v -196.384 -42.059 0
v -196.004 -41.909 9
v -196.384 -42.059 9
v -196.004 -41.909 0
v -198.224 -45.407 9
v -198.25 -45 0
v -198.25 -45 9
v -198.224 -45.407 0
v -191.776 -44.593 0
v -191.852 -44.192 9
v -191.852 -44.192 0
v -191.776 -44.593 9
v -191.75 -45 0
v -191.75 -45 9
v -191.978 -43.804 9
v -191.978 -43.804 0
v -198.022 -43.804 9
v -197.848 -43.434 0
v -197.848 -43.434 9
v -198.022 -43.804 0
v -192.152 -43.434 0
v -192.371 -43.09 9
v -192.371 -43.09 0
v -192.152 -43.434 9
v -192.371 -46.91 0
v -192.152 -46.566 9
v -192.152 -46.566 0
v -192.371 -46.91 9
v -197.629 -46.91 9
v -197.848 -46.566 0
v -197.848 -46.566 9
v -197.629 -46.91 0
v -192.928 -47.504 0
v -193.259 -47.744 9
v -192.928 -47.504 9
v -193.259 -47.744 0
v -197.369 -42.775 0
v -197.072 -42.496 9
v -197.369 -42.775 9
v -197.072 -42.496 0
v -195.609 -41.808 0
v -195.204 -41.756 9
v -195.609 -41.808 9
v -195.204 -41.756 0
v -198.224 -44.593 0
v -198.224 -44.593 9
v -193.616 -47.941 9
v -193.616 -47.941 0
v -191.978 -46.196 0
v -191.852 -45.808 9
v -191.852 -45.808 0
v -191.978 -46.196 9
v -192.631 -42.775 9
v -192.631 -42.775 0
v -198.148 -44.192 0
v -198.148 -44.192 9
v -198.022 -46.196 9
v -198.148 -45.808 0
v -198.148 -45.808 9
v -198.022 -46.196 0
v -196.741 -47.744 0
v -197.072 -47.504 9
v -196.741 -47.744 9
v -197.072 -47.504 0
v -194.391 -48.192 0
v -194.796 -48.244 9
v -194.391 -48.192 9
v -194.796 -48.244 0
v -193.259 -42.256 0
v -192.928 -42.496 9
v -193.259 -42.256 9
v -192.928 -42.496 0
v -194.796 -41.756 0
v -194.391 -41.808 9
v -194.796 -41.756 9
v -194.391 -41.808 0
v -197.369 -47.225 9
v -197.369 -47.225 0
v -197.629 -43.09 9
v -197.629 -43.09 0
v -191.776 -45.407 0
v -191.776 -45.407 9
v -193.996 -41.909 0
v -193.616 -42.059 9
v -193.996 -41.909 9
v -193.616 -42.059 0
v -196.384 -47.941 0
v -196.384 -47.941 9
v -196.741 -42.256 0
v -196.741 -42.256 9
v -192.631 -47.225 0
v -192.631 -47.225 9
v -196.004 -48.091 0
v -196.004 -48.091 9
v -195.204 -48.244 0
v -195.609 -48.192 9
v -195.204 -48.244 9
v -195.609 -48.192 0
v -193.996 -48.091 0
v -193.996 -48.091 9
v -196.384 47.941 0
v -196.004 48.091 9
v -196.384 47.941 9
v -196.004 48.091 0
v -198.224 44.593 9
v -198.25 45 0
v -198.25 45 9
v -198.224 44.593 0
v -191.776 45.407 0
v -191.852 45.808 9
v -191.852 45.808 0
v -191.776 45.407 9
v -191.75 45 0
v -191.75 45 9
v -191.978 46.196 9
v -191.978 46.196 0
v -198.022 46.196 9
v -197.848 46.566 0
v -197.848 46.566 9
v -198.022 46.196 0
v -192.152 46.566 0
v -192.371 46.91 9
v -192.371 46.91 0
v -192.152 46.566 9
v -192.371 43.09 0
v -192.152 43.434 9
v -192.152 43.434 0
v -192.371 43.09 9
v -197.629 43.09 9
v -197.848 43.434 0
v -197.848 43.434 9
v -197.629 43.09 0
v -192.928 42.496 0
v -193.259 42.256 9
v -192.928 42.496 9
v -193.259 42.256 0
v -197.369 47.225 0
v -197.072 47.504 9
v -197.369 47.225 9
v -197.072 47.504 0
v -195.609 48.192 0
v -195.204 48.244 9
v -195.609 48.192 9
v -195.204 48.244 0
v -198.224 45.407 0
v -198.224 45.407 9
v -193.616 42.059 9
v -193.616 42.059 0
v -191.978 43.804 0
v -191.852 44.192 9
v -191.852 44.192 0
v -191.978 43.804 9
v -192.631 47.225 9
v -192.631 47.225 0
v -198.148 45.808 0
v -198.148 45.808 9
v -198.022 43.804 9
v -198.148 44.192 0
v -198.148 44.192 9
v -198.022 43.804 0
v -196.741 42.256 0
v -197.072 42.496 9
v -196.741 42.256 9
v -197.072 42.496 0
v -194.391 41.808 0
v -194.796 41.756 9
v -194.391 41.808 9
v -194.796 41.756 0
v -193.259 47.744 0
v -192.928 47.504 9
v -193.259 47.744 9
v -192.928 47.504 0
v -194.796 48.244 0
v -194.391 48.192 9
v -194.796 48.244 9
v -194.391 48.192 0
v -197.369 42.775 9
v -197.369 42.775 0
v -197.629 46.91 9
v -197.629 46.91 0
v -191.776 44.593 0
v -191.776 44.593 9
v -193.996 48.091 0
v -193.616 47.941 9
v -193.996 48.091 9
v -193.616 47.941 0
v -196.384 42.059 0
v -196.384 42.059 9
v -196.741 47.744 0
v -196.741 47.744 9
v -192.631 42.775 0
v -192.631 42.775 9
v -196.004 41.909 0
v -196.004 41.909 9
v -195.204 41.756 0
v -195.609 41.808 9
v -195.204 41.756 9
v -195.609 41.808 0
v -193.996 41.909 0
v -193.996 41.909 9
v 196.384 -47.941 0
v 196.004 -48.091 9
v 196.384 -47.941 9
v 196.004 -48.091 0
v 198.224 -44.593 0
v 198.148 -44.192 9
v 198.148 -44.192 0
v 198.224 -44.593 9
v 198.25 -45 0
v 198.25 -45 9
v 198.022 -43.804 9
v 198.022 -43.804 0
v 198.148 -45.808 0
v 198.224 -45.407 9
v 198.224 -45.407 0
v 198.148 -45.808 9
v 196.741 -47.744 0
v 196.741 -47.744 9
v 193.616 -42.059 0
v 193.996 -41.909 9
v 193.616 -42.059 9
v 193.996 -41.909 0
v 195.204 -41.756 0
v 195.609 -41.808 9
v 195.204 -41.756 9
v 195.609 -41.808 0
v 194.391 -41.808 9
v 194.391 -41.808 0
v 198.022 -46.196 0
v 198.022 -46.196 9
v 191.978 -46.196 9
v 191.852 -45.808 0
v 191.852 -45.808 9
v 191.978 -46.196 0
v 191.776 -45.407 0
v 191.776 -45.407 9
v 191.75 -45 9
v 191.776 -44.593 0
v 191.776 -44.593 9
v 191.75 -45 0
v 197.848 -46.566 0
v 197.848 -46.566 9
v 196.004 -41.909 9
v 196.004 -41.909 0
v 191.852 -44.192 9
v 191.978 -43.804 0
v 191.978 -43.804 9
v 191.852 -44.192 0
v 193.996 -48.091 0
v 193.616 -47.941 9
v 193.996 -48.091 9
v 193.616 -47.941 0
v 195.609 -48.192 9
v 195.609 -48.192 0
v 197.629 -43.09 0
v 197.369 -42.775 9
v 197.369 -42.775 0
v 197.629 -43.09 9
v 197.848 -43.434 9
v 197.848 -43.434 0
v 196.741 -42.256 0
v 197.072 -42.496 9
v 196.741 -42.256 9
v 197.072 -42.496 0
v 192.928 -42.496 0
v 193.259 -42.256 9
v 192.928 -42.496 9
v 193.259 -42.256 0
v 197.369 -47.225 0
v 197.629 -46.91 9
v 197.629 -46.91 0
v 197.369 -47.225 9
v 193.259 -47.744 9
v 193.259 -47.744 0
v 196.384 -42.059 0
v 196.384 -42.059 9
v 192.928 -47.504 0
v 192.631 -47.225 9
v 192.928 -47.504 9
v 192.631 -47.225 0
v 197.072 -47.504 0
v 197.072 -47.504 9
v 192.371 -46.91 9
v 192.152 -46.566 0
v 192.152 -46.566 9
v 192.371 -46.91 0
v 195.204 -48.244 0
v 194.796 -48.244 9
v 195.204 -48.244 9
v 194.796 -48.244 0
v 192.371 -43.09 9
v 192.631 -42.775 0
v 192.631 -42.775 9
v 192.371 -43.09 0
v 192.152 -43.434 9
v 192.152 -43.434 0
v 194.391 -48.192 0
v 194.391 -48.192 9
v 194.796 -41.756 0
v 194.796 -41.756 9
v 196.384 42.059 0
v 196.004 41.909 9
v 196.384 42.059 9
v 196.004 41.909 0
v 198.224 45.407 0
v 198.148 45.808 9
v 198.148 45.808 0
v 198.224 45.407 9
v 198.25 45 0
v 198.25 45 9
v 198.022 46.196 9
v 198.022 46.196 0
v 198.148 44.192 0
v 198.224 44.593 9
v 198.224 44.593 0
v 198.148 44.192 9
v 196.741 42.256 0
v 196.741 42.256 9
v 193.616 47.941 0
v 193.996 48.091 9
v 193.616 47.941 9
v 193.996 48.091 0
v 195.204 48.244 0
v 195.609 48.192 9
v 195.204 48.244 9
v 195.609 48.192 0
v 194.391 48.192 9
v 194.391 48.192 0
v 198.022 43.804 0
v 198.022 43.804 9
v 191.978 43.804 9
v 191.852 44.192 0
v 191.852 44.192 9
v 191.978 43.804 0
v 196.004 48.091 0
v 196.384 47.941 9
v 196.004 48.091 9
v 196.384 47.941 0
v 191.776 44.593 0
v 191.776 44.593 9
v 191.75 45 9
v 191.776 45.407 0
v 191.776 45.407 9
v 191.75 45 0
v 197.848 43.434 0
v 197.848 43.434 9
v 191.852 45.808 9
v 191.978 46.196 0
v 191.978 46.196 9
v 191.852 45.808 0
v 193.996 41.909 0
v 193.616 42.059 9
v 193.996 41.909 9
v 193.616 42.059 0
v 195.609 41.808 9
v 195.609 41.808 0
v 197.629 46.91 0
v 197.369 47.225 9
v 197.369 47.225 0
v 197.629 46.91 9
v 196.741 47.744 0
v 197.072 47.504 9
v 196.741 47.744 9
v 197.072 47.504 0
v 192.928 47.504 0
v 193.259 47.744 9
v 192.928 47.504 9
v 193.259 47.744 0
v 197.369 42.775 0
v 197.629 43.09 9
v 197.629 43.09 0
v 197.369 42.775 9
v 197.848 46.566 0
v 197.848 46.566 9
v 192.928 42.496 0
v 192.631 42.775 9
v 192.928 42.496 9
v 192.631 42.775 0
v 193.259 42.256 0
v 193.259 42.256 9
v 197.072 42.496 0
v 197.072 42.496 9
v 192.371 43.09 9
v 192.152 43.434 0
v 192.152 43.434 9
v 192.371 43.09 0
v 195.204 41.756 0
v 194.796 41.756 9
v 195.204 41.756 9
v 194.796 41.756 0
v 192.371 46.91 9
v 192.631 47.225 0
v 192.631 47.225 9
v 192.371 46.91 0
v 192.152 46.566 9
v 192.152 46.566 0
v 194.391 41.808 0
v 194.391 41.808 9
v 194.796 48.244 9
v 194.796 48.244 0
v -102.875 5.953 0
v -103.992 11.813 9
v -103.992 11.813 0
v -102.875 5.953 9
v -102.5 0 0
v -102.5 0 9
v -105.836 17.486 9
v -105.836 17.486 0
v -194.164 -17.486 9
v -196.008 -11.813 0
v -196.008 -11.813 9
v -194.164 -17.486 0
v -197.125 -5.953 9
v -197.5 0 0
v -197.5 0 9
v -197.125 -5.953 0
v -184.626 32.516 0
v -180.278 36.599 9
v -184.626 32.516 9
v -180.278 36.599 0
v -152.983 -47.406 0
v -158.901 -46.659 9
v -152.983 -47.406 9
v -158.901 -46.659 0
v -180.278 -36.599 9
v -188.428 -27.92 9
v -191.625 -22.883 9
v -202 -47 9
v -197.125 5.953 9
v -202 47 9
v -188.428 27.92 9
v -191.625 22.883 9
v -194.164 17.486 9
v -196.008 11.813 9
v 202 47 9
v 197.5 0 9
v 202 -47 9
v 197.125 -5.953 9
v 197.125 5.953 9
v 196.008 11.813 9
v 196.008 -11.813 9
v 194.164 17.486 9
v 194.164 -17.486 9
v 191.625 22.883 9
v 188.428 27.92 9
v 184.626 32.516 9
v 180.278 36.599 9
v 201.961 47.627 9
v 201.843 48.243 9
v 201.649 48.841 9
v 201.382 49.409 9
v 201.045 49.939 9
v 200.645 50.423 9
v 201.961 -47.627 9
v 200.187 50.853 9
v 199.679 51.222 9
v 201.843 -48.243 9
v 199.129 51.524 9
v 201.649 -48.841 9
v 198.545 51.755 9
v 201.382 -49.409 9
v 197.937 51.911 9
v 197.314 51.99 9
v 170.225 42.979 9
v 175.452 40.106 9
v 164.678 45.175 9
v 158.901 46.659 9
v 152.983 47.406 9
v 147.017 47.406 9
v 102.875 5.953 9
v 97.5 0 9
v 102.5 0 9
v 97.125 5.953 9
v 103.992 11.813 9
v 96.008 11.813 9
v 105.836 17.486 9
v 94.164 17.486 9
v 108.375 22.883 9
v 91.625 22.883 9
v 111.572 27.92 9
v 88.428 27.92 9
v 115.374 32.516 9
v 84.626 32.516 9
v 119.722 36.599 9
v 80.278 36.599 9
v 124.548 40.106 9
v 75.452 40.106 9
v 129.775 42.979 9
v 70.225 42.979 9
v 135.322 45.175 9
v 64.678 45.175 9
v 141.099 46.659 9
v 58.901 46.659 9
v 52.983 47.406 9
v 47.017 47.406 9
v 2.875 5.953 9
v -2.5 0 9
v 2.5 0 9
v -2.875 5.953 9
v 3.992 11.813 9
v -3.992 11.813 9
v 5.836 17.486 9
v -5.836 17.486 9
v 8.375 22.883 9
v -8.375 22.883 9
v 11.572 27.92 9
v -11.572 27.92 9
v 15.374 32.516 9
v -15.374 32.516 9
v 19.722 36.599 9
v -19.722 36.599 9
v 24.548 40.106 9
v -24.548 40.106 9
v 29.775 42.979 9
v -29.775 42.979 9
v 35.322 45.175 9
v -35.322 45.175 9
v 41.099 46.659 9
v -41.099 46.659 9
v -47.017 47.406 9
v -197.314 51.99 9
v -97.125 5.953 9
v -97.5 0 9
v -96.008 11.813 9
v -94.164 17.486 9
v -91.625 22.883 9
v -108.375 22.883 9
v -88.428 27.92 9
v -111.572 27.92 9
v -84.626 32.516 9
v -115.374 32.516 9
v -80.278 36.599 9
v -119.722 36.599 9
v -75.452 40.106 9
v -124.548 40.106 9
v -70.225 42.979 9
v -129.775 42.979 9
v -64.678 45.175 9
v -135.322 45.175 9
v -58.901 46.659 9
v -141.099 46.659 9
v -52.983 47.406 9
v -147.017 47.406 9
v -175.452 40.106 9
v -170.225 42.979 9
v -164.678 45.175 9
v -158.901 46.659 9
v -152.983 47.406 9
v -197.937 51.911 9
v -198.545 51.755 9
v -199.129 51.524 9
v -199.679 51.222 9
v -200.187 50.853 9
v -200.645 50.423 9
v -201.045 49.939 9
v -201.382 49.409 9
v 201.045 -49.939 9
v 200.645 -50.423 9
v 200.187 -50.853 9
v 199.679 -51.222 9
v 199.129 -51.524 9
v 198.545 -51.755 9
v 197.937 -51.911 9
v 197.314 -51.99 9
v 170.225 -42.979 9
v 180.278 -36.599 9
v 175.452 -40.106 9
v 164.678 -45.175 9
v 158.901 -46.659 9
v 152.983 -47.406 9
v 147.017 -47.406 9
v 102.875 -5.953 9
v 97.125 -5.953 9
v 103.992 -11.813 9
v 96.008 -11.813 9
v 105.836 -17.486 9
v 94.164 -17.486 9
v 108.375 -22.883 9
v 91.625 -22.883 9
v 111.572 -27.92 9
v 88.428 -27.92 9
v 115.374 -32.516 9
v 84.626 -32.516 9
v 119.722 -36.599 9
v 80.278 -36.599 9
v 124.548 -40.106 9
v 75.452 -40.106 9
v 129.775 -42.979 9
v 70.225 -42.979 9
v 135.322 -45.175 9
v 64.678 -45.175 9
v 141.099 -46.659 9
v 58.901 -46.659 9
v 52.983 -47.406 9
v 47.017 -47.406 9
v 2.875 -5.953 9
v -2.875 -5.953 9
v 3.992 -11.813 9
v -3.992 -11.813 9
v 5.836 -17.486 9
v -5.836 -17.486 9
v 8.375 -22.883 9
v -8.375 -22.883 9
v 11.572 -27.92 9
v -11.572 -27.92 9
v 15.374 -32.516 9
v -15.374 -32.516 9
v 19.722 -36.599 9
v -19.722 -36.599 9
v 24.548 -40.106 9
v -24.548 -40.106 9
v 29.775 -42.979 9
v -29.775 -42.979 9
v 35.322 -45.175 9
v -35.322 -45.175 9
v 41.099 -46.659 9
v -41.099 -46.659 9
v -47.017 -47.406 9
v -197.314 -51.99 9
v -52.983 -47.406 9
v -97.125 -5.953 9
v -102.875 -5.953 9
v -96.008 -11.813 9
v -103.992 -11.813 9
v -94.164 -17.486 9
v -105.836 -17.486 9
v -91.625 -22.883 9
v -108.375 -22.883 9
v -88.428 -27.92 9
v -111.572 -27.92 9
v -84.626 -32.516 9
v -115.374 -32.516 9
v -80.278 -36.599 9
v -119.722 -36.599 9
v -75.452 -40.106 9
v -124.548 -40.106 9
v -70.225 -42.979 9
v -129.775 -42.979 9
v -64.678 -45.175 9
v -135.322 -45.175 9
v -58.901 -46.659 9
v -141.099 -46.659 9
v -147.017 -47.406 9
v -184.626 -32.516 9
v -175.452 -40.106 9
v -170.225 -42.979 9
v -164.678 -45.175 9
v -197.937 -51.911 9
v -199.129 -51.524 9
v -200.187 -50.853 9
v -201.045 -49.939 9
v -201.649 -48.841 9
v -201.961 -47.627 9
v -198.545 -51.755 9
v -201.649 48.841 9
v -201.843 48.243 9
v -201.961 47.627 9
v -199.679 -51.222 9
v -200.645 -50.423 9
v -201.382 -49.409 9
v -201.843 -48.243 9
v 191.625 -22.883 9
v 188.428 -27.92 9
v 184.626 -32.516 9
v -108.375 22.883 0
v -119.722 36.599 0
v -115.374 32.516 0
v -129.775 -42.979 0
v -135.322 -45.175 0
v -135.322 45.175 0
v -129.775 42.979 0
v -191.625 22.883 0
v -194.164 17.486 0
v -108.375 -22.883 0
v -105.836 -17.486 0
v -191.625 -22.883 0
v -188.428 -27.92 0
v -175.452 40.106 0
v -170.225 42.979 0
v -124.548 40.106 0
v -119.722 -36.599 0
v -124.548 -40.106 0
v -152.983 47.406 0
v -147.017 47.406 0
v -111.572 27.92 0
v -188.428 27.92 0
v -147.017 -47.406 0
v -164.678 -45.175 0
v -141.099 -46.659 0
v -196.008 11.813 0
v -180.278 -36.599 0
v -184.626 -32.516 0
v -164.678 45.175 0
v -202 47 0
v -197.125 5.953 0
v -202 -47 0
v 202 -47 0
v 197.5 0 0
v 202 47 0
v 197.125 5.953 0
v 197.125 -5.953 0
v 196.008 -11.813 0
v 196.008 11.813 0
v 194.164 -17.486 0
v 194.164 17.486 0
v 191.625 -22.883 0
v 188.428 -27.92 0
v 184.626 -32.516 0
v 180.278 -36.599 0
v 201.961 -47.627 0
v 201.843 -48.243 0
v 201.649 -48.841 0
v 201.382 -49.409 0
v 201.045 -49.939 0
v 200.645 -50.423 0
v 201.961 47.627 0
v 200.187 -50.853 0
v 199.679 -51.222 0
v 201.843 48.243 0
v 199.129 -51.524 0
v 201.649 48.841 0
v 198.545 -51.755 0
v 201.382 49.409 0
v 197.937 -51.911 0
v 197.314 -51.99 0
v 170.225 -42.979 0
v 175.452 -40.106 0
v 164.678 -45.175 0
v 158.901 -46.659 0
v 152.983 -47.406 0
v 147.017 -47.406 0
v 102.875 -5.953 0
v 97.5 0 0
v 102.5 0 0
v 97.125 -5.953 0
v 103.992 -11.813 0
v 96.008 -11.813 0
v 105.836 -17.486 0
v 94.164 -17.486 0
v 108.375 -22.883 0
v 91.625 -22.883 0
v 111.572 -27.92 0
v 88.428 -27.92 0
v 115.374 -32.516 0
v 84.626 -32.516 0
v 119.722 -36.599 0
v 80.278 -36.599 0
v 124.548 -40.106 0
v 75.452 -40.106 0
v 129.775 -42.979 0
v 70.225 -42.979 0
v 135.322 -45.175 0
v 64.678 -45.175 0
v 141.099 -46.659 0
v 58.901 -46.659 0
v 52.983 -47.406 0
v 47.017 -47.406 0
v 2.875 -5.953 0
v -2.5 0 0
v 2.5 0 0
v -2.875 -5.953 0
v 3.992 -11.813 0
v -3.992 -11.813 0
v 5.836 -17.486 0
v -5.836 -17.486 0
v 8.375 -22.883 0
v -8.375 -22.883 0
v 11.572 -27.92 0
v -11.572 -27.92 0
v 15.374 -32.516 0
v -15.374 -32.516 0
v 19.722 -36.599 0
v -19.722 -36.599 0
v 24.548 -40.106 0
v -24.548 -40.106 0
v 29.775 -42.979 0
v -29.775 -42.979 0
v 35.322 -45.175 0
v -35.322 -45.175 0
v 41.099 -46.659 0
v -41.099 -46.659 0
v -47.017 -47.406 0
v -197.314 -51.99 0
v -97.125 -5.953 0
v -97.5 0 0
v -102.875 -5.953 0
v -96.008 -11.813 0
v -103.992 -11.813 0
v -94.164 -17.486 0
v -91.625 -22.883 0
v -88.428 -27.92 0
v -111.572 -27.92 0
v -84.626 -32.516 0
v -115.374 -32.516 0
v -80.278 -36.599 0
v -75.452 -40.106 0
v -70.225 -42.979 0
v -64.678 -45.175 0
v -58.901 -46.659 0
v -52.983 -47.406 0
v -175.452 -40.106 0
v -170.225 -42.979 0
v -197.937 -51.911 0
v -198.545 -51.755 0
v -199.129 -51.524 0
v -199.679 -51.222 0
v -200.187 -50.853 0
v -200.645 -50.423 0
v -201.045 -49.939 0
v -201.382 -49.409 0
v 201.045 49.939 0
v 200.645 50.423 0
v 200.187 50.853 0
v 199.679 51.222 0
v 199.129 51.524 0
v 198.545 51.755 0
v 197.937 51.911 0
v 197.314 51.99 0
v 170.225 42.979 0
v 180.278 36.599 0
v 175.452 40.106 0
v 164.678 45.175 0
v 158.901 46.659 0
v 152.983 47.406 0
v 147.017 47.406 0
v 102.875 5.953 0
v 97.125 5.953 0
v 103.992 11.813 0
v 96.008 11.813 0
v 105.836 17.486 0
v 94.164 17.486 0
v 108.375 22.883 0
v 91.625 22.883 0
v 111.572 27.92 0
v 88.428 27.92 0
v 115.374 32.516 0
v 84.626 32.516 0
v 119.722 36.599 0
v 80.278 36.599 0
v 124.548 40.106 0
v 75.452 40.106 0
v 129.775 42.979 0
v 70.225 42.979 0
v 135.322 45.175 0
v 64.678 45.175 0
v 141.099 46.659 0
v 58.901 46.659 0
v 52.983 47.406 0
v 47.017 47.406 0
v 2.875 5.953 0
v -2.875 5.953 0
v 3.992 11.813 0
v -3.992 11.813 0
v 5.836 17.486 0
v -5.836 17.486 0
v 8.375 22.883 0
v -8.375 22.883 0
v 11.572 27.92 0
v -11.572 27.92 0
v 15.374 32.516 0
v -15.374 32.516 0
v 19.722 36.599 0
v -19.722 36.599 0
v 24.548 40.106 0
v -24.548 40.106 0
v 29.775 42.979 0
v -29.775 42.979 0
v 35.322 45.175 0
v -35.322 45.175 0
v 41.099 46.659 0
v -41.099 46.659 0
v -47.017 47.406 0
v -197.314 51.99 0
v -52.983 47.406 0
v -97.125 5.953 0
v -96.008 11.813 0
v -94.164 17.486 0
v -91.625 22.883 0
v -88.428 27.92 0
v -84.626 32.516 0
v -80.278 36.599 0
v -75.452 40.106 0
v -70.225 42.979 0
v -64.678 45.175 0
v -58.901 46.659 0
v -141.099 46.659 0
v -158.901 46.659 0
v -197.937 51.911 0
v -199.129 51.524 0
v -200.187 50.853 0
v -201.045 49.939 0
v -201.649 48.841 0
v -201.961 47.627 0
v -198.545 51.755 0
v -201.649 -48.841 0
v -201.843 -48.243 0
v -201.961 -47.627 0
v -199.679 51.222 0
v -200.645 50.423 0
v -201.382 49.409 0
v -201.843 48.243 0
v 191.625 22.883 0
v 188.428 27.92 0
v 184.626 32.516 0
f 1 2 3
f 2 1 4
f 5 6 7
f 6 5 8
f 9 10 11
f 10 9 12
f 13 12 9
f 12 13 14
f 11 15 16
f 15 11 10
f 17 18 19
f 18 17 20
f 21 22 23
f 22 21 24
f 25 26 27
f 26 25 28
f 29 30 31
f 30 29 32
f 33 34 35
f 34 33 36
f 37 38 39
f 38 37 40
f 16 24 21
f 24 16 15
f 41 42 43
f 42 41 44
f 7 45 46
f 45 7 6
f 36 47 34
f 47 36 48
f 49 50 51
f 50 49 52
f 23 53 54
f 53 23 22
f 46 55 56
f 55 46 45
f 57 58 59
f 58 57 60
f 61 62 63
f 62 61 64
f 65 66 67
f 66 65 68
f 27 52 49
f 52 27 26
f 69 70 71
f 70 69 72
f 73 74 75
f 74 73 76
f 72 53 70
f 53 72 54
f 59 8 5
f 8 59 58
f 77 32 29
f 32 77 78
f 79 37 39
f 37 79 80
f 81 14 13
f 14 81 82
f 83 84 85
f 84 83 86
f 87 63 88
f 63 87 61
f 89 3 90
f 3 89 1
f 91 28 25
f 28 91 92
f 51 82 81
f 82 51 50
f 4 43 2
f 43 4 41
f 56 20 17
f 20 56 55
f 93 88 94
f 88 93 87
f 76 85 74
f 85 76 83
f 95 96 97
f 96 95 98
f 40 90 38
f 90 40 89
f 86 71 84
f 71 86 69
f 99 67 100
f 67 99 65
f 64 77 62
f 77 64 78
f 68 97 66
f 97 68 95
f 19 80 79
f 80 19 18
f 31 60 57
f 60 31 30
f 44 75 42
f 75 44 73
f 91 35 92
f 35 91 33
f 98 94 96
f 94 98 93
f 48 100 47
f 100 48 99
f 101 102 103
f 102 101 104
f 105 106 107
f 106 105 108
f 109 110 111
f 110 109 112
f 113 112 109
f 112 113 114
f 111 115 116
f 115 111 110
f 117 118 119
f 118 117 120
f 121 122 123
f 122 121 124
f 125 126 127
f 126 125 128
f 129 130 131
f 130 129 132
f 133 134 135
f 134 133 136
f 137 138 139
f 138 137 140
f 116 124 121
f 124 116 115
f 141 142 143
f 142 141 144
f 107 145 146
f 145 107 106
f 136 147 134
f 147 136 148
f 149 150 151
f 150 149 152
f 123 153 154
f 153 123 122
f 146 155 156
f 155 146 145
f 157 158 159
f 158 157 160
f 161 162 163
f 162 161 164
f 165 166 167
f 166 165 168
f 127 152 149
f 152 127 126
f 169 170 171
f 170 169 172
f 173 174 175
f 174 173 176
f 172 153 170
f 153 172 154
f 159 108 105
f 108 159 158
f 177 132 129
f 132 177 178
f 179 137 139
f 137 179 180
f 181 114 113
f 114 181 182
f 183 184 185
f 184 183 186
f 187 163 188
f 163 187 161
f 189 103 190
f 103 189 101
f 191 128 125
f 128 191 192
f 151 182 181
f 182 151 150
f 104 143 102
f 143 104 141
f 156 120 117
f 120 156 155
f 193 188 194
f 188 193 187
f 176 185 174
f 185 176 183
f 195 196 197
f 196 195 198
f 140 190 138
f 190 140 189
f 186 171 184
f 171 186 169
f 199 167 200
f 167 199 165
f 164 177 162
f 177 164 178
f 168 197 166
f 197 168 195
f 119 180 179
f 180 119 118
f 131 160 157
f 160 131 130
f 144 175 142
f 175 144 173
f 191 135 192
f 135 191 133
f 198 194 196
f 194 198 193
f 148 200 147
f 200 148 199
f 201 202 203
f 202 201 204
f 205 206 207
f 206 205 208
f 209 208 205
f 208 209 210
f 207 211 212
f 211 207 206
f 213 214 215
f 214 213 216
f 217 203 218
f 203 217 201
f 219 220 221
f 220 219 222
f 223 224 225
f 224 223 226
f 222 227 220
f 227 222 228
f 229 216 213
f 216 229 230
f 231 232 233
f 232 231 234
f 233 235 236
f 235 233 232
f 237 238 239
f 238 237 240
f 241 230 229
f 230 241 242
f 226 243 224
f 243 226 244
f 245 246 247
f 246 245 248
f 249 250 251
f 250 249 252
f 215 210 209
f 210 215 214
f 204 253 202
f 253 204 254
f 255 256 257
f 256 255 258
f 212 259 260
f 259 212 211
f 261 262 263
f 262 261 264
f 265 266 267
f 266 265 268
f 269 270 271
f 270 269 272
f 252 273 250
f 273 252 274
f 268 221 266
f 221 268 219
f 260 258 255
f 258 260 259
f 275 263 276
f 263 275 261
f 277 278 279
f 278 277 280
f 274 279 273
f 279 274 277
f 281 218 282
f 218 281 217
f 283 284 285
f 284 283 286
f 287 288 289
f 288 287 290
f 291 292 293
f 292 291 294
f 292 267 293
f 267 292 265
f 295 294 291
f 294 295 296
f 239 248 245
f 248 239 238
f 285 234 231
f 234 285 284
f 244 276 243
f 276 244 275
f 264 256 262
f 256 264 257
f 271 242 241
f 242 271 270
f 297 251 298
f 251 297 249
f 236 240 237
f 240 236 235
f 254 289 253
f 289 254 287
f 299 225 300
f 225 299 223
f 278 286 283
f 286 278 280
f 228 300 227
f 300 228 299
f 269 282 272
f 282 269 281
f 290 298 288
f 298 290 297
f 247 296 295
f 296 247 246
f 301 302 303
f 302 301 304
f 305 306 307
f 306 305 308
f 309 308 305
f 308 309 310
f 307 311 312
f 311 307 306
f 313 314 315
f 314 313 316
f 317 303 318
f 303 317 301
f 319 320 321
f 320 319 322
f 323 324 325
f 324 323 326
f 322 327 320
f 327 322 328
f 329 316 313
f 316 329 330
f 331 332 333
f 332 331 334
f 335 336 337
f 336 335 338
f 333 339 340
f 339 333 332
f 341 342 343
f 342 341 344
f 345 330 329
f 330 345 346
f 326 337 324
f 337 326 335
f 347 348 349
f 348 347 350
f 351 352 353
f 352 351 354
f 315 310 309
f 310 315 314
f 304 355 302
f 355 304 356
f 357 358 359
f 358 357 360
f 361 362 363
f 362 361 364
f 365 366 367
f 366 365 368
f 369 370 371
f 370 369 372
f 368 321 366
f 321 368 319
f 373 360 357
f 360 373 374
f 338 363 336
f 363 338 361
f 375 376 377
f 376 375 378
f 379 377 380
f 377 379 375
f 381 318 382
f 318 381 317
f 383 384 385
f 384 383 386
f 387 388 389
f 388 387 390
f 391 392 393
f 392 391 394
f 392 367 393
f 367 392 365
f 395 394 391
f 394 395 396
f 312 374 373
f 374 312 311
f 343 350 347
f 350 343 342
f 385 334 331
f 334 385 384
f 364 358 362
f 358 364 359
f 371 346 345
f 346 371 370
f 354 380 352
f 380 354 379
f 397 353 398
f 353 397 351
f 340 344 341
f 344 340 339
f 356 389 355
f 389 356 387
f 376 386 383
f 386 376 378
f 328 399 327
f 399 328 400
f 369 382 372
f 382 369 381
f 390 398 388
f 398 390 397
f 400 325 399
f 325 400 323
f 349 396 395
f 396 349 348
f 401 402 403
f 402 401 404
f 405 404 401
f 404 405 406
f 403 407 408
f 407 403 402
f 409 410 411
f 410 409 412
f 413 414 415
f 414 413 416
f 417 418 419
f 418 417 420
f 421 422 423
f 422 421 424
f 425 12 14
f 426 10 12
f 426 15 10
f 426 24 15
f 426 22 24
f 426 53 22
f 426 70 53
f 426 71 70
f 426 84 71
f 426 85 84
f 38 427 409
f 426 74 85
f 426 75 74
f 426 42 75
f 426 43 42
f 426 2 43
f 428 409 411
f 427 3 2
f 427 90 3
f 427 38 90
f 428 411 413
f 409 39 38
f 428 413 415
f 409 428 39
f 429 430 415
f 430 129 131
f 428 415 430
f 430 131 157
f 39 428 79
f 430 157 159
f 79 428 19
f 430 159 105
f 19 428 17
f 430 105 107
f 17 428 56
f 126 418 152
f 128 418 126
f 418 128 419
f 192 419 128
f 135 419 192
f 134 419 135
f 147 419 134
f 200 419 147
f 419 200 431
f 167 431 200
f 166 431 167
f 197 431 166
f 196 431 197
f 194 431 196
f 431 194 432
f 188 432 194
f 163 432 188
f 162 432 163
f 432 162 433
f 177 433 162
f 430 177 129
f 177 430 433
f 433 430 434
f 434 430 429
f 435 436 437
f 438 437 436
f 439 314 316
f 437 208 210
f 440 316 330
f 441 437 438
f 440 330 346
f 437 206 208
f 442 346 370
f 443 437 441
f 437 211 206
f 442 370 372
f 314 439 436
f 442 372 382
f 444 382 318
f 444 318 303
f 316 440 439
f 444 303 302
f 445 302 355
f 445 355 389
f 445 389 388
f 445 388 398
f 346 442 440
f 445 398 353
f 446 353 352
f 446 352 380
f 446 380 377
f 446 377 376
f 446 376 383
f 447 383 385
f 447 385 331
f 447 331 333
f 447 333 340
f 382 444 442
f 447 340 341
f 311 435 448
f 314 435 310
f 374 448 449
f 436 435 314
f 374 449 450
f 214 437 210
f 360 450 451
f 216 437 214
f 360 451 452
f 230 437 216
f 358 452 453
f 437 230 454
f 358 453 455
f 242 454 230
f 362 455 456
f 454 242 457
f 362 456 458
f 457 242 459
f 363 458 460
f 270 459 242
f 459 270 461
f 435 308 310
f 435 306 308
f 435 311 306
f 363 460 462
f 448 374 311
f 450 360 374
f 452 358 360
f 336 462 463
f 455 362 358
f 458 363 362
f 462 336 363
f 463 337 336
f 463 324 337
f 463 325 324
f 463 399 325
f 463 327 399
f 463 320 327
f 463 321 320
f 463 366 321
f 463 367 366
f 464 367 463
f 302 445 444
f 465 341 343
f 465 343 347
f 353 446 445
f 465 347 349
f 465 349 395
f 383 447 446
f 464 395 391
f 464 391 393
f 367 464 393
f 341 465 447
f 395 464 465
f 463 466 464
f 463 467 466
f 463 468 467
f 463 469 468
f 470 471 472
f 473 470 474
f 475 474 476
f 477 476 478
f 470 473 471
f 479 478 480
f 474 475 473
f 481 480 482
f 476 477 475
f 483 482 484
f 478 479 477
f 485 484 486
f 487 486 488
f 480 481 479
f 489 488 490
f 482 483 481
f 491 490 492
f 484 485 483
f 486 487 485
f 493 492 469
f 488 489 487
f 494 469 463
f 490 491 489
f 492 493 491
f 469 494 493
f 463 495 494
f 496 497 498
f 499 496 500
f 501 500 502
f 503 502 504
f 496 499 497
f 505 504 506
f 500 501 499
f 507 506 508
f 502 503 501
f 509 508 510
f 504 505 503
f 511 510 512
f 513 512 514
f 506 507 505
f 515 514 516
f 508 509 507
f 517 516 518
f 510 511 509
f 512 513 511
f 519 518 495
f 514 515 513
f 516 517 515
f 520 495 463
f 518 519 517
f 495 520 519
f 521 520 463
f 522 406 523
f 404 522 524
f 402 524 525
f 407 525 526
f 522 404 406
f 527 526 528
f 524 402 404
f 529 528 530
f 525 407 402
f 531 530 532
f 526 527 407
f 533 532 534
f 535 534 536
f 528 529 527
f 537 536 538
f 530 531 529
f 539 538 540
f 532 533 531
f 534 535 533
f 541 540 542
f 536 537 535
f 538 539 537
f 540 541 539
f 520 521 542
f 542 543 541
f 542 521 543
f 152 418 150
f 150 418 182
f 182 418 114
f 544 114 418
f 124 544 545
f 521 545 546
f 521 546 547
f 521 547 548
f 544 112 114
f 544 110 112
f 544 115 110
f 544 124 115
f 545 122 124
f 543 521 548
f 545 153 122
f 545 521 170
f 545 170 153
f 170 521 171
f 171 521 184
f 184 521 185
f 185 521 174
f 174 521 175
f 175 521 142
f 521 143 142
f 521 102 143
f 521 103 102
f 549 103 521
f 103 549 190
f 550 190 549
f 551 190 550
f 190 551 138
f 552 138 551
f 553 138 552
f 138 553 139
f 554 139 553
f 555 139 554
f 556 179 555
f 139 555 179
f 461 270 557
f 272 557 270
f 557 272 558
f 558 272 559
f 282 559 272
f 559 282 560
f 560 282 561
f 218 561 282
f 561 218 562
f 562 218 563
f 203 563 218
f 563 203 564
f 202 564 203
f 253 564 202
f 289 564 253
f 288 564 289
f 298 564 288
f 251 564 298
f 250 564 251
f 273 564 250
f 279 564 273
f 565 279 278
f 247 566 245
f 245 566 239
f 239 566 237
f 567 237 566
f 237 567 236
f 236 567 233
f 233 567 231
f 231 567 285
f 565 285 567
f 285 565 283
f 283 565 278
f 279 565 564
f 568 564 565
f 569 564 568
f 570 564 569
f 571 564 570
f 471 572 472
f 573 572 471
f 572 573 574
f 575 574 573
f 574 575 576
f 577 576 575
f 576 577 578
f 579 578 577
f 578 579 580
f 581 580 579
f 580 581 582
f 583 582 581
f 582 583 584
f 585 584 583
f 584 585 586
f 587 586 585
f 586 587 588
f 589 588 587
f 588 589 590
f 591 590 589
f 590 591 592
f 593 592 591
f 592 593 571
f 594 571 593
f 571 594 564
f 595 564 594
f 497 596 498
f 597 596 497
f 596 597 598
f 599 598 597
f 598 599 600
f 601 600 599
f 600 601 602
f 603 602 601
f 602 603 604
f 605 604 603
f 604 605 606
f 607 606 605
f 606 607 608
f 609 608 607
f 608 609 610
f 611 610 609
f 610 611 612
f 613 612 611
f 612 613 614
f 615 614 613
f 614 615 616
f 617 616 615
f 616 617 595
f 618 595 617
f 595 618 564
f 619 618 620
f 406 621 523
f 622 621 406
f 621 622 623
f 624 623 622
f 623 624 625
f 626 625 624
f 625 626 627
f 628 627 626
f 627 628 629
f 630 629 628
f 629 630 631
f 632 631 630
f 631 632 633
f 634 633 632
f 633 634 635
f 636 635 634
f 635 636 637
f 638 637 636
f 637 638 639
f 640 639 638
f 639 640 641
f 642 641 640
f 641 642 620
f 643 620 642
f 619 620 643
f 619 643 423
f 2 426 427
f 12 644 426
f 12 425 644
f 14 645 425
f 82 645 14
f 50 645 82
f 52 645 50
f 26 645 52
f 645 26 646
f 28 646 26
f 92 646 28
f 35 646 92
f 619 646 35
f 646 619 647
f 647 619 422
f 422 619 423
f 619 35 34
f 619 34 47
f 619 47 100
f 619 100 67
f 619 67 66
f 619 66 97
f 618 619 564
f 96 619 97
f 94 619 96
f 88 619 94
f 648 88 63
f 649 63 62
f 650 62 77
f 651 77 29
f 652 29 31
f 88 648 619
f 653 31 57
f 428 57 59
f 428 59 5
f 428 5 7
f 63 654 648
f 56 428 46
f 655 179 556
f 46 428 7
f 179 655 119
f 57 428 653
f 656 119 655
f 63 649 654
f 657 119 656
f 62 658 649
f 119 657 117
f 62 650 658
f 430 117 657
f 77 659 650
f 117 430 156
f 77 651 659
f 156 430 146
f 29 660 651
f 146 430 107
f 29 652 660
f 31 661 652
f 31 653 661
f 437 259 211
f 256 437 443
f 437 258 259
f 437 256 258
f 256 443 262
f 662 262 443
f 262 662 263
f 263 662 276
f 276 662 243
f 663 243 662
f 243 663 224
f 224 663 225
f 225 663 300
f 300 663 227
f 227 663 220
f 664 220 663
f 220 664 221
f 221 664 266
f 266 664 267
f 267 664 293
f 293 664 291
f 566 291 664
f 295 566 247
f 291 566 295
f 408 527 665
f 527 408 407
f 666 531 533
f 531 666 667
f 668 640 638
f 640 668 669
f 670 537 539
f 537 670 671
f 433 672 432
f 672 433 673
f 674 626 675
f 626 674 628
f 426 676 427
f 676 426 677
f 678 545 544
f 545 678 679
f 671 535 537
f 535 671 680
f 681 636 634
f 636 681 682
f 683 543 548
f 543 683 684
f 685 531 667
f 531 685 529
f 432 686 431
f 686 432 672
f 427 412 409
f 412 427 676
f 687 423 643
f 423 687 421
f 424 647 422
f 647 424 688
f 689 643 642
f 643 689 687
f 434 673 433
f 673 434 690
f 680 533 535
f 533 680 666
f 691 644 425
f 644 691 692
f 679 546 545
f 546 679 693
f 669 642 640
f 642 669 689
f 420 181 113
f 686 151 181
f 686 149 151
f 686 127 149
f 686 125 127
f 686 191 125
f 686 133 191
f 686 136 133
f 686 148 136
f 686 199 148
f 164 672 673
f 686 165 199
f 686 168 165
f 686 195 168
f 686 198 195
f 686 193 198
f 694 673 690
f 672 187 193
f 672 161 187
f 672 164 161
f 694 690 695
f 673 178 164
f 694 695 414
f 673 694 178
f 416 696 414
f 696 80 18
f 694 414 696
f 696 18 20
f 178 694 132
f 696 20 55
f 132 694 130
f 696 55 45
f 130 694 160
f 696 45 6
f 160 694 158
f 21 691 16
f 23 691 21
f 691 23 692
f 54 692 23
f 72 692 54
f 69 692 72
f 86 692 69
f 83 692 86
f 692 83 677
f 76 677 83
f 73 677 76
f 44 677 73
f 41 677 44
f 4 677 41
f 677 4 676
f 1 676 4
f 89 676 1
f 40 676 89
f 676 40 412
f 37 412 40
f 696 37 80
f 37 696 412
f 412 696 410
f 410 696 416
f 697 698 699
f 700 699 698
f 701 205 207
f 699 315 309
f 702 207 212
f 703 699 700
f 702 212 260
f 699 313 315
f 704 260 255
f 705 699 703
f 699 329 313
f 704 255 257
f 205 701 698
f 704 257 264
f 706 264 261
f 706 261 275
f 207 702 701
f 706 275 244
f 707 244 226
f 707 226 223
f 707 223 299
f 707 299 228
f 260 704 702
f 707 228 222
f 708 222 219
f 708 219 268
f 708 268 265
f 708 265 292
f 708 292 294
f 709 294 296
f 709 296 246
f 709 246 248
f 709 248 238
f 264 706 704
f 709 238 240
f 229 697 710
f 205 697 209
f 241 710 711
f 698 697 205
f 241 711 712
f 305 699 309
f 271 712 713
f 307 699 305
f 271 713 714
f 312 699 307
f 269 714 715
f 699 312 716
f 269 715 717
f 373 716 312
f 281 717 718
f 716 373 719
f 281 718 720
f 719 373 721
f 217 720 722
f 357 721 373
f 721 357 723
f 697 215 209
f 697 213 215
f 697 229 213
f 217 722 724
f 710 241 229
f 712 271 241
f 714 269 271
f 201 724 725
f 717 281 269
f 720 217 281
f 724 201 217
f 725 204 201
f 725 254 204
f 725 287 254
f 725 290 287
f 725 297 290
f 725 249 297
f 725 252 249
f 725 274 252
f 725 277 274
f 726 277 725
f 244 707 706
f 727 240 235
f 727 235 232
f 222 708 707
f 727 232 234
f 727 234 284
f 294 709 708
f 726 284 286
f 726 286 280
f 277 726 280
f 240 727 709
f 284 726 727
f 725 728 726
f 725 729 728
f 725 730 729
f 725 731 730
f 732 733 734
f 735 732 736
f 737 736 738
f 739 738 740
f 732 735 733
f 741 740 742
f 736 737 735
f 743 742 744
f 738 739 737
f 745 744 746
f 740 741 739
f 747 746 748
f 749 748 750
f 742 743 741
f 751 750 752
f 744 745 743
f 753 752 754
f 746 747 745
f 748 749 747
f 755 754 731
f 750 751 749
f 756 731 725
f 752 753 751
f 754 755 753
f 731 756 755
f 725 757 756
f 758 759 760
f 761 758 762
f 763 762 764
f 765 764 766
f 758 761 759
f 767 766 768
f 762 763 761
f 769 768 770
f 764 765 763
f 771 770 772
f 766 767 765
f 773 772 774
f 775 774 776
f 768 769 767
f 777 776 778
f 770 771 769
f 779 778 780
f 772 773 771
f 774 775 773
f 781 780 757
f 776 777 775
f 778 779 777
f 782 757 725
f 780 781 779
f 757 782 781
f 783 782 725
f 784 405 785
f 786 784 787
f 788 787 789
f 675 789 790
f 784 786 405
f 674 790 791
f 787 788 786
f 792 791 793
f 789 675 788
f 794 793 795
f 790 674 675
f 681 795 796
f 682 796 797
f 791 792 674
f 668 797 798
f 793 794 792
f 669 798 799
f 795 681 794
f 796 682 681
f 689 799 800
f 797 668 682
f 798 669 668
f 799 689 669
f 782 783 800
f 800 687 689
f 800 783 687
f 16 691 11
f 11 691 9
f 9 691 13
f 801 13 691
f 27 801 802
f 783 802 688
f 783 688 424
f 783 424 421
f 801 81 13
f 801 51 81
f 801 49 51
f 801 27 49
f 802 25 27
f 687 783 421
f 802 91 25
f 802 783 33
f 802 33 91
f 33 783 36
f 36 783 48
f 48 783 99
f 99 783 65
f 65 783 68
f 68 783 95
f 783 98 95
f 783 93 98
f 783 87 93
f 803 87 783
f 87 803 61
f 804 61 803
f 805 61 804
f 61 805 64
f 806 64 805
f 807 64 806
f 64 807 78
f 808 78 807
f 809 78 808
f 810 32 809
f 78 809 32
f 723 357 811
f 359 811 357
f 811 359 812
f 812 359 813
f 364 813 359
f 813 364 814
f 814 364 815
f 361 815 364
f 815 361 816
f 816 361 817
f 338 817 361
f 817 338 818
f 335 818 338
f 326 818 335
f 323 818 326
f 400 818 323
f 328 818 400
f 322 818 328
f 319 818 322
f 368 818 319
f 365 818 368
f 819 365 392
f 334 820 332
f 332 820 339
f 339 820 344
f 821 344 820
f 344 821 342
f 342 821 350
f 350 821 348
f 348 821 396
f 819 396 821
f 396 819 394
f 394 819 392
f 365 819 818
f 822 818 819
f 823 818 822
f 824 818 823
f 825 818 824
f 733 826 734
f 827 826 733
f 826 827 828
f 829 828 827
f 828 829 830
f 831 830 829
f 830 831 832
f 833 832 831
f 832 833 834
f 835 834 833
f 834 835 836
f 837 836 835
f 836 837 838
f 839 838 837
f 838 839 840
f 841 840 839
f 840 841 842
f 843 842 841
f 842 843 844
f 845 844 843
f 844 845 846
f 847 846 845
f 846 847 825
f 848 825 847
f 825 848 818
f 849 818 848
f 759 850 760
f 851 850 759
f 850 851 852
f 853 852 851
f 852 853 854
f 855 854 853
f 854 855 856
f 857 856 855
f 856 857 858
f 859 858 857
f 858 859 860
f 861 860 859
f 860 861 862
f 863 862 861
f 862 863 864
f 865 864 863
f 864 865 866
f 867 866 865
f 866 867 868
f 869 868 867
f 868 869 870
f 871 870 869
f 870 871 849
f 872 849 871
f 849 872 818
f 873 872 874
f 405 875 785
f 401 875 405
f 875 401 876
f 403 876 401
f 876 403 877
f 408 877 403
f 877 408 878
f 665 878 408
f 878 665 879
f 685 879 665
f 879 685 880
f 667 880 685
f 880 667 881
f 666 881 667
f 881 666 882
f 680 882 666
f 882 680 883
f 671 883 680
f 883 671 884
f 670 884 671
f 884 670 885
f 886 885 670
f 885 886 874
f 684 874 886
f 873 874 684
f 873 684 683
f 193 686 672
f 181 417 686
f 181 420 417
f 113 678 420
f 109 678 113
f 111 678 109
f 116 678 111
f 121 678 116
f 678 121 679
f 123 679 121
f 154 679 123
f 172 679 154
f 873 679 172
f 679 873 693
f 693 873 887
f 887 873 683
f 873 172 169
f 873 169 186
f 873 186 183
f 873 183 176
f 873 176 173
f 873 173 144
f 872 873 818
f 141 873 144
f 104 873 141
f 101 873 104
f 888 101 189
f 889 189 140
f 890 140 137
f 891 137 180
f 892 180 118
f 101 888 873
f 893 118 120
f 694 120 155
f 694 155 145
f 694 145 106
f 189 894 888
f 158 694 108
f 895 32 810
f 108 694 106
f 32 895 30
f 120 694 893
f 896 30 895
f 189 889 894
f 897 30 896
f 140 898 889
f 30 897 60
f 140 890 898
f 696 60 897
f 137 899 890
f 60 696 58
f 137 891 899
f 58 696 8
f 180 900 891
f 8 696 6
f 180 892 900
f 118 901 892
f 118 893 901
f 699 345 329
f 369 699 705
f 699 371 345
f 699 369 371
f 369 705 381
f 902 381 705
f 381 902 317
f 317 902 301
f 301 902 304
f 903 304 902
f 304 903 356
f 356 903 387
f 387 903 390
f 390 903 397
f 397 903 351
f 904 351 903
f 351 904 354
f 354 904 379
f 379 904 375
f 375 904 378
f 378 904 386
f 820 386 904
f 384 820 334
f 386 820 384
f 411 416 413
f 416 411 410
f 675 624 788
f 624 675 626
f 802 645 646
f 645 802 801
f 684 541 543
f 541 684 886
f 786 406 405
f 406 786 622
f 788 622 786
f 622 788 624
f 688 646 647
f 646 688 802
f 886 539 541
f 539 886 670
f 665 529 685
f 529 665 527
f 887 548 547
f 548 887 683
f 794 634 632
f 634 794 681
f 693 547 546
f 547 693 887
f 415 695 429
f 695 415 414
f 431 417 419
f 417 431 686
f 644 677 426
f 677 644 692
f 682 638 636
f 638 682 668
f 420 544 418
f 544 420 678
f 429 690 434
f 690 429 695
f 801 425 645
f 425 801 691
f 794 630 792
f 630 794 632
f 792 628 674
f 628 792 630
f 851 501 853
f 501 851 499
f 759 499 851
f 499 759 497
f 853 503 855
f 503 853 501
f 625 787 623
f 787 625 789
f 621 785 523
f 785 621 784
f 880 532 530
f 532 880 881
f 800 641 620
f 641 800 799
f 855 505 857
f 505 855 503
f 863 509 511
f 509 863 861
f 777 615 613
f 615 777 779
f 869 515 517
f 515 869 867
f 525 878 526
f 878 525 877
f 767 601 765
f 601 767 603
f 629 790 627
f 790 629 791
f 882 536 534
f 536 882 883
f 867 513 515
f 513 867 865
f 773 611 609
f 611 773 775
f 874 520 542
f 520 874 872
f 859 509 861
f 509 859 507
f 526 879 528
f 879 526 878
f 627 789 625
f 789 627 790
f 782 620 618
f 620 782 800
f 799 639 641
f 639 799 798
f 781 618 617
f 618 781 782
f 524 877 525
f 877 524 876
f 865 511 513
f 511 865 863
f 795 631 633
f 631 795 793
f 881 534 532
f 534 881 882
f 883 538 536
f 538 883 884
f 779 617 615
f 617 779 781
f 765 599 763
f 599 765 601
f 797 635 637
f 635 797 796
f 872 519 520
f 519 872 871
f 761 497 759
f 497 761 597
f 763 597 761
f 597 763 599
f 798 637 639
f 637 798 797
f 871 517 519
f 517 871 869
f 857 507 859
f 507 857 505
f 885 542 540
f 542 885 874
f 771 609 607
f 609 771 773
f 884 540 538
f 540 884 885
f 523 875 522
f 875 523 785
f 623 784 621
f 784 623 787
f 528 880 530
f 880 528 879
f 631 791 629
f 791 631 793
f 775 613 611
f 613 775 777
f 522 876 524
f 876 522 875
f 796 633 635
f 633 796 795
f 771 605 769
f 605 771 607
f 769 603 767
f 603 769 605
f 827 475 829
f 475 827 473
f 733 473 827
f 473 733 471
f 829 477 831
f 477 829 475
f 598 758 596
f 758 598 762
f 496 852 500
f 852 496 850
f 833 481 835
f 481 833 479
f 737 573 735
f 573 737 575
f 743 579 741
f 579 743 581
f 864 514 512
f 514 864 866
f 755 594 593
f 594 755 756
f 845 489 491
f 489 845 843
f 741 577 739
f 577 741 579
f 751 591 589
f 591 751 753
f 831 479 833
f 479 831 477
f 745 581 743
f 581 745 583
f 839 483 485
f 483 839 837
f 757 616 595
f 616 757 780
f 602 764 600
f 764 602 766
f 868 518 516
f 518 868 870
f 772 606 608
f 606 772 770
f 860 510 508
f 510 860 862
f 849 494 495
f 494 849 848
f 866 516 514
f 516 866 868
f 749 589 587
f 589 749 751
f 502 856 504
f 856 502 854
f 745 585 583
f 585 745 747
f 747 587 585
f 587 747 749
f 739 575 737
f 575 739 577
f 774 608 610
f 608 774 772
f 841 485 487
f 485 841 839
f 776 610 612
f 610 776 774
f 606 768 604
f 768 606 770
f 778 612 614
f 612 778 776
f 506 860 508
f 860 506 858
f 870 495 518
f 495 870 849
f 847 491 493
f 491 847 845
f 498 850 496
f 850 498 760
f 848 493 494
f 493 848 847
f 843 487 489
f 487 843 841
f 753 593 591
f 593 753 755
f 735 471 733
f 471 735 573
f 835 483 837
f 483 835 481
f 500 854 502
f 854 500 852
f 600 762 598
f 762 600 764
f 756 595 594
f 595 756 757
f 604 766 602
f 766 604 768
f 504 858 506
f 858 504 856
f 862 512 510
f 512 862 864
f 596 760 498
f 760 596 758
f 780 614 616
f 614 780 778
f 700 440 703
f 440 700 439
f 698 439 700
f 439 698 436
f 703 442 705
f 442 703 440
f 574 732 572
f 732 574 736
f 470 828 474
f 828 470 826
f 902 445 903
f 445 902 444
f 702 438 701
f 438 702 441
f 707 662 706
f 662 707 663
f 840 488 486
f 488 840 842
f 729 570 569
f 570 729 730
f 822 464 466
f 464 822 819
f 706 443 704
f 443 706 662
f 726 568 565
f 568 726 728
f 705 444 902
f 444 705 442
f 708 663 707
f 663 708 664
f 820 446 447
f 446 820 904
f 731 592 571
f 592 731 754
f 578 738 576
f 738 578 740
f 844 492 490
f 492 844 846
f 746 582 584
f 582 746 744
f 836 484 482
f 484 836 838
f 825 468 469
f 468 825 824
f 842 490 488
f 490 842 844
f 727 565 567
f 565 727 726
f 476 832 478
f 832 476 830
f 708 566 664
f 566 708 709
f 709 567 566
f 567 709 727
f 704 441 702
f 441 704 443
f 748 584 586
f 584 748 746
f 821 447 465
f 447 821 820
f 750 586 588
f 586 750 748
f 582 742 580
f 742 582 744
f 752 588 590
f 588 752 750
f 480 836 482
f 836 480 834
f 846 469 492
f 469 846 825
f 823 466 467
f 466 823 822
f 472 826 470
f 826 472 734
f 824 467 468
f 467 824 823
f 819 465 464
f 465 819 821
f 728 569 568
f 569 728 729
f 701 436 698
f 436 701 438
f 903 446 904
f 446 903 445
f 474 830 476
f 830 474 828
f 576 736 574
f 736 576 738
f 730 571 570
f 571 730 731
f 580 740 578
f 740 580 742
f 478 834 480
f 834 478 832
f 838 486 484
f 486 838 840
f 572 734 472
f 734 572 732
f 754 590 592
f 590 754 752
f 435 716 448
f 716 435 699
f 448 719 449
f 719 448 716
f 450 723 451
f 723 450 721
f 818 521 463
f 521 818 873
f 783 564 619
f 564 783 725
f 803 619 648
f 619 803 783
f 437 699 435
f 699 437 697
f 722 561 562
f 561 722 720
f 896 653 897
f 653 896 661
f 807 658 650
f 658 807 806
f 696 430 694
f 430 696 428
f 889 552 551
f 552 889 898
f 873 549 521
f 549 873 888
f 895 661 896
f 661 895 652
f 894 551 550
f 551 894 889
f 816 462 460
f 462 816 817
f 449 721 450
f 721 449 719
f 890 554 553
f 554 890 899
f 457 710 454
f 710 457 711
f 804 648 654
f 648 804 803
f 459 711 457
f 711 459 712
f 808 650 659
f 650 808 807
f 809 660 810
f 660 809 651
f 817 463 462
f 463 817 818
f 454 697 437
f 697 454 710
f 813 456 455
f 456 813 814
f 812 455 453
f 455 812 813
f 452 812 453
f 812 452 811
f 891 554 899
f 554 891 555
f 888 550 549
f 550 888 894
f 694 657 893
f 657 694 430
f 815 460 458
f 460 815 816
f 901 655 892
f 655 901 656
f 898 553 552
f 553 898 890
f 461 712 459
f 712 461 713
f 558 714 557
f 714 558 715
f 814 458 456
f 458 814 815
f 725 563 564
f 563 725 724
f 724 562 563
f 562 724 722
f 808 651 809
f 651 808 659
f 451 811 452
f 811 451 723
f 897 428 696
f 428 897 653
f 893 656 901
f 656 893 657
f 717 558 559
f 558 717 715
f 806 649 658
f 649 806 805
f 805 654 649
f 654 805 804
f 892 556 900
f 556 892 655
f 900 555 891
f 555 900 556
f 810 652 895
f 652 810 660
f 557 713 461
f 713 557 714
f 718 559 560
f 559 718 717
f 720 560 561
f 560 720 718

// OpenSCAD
$fn = 50;

difference() {
	union() {
		hull() {
			translate(v = [-197.0, 47.0, 0]) {
				cylinder(h = 9, r = 5);
			}
			translate(v = [197.0, 47.0, 0]) {
				cylinder(h = 9, r = 5);
			}
			translate(v = [-197.0, -47.0, 0]) {
				cylinder(h = 9, r = 5);
			}
			translate(v = [197.0, -47.0, 0]) {
				cylinder(h = 9, r = 5);
			}
		}
	}
	union() {
		translate(v = [-195.0, -45.0, -100.0]) {
			cylinder(h = 200, r = 3.25);
		}
		translate(v = [-195.0, 45.0, -100.0]) {
			cylinder(h = 200, r = 3.25);
		}
		translate(v = [195.0, -45.0, -100.0]) {
			cylinder(h = 200, r = 3.25);
		}
		translate(v = [195.0, 45.0, -100.0]) {
			cylinder(h = 200, r = 3.25);
		}
		translate(v = [-195.0, -45.0, -100.0]) {
			cylinder(h = 200, r = 1.8);
		}
		translate(v = [-195.0, 45.0, -100.0]) {
			cylinder(h = 200, r = 1.8);
		}
		translate(v = [195.0, -45.0, -100.0]) {
			cylinder(h = 200, r = 1.8);
		}
		translate(v = [195.0, 45.0, -100.0]) {
			cylinder(h = 200, r = 1.8);
		}
		translate(v = [-150.0, 0, 0.0]) {
			cylinder(h = 9, r = 47.5);
		}
		translate(v = [-50.0, 0, 0.0]) {
			cylinder(h = 9, r = 47.5);
		}
		translate(v = [50.0, 0, 0.0]) {
			cylinder(h = 9, r = 47.5);
		}
		translate(v = [150.0, 0, 0.0]) {
			cylinder(h = 9, r = 47.5);
		}
	}
}
